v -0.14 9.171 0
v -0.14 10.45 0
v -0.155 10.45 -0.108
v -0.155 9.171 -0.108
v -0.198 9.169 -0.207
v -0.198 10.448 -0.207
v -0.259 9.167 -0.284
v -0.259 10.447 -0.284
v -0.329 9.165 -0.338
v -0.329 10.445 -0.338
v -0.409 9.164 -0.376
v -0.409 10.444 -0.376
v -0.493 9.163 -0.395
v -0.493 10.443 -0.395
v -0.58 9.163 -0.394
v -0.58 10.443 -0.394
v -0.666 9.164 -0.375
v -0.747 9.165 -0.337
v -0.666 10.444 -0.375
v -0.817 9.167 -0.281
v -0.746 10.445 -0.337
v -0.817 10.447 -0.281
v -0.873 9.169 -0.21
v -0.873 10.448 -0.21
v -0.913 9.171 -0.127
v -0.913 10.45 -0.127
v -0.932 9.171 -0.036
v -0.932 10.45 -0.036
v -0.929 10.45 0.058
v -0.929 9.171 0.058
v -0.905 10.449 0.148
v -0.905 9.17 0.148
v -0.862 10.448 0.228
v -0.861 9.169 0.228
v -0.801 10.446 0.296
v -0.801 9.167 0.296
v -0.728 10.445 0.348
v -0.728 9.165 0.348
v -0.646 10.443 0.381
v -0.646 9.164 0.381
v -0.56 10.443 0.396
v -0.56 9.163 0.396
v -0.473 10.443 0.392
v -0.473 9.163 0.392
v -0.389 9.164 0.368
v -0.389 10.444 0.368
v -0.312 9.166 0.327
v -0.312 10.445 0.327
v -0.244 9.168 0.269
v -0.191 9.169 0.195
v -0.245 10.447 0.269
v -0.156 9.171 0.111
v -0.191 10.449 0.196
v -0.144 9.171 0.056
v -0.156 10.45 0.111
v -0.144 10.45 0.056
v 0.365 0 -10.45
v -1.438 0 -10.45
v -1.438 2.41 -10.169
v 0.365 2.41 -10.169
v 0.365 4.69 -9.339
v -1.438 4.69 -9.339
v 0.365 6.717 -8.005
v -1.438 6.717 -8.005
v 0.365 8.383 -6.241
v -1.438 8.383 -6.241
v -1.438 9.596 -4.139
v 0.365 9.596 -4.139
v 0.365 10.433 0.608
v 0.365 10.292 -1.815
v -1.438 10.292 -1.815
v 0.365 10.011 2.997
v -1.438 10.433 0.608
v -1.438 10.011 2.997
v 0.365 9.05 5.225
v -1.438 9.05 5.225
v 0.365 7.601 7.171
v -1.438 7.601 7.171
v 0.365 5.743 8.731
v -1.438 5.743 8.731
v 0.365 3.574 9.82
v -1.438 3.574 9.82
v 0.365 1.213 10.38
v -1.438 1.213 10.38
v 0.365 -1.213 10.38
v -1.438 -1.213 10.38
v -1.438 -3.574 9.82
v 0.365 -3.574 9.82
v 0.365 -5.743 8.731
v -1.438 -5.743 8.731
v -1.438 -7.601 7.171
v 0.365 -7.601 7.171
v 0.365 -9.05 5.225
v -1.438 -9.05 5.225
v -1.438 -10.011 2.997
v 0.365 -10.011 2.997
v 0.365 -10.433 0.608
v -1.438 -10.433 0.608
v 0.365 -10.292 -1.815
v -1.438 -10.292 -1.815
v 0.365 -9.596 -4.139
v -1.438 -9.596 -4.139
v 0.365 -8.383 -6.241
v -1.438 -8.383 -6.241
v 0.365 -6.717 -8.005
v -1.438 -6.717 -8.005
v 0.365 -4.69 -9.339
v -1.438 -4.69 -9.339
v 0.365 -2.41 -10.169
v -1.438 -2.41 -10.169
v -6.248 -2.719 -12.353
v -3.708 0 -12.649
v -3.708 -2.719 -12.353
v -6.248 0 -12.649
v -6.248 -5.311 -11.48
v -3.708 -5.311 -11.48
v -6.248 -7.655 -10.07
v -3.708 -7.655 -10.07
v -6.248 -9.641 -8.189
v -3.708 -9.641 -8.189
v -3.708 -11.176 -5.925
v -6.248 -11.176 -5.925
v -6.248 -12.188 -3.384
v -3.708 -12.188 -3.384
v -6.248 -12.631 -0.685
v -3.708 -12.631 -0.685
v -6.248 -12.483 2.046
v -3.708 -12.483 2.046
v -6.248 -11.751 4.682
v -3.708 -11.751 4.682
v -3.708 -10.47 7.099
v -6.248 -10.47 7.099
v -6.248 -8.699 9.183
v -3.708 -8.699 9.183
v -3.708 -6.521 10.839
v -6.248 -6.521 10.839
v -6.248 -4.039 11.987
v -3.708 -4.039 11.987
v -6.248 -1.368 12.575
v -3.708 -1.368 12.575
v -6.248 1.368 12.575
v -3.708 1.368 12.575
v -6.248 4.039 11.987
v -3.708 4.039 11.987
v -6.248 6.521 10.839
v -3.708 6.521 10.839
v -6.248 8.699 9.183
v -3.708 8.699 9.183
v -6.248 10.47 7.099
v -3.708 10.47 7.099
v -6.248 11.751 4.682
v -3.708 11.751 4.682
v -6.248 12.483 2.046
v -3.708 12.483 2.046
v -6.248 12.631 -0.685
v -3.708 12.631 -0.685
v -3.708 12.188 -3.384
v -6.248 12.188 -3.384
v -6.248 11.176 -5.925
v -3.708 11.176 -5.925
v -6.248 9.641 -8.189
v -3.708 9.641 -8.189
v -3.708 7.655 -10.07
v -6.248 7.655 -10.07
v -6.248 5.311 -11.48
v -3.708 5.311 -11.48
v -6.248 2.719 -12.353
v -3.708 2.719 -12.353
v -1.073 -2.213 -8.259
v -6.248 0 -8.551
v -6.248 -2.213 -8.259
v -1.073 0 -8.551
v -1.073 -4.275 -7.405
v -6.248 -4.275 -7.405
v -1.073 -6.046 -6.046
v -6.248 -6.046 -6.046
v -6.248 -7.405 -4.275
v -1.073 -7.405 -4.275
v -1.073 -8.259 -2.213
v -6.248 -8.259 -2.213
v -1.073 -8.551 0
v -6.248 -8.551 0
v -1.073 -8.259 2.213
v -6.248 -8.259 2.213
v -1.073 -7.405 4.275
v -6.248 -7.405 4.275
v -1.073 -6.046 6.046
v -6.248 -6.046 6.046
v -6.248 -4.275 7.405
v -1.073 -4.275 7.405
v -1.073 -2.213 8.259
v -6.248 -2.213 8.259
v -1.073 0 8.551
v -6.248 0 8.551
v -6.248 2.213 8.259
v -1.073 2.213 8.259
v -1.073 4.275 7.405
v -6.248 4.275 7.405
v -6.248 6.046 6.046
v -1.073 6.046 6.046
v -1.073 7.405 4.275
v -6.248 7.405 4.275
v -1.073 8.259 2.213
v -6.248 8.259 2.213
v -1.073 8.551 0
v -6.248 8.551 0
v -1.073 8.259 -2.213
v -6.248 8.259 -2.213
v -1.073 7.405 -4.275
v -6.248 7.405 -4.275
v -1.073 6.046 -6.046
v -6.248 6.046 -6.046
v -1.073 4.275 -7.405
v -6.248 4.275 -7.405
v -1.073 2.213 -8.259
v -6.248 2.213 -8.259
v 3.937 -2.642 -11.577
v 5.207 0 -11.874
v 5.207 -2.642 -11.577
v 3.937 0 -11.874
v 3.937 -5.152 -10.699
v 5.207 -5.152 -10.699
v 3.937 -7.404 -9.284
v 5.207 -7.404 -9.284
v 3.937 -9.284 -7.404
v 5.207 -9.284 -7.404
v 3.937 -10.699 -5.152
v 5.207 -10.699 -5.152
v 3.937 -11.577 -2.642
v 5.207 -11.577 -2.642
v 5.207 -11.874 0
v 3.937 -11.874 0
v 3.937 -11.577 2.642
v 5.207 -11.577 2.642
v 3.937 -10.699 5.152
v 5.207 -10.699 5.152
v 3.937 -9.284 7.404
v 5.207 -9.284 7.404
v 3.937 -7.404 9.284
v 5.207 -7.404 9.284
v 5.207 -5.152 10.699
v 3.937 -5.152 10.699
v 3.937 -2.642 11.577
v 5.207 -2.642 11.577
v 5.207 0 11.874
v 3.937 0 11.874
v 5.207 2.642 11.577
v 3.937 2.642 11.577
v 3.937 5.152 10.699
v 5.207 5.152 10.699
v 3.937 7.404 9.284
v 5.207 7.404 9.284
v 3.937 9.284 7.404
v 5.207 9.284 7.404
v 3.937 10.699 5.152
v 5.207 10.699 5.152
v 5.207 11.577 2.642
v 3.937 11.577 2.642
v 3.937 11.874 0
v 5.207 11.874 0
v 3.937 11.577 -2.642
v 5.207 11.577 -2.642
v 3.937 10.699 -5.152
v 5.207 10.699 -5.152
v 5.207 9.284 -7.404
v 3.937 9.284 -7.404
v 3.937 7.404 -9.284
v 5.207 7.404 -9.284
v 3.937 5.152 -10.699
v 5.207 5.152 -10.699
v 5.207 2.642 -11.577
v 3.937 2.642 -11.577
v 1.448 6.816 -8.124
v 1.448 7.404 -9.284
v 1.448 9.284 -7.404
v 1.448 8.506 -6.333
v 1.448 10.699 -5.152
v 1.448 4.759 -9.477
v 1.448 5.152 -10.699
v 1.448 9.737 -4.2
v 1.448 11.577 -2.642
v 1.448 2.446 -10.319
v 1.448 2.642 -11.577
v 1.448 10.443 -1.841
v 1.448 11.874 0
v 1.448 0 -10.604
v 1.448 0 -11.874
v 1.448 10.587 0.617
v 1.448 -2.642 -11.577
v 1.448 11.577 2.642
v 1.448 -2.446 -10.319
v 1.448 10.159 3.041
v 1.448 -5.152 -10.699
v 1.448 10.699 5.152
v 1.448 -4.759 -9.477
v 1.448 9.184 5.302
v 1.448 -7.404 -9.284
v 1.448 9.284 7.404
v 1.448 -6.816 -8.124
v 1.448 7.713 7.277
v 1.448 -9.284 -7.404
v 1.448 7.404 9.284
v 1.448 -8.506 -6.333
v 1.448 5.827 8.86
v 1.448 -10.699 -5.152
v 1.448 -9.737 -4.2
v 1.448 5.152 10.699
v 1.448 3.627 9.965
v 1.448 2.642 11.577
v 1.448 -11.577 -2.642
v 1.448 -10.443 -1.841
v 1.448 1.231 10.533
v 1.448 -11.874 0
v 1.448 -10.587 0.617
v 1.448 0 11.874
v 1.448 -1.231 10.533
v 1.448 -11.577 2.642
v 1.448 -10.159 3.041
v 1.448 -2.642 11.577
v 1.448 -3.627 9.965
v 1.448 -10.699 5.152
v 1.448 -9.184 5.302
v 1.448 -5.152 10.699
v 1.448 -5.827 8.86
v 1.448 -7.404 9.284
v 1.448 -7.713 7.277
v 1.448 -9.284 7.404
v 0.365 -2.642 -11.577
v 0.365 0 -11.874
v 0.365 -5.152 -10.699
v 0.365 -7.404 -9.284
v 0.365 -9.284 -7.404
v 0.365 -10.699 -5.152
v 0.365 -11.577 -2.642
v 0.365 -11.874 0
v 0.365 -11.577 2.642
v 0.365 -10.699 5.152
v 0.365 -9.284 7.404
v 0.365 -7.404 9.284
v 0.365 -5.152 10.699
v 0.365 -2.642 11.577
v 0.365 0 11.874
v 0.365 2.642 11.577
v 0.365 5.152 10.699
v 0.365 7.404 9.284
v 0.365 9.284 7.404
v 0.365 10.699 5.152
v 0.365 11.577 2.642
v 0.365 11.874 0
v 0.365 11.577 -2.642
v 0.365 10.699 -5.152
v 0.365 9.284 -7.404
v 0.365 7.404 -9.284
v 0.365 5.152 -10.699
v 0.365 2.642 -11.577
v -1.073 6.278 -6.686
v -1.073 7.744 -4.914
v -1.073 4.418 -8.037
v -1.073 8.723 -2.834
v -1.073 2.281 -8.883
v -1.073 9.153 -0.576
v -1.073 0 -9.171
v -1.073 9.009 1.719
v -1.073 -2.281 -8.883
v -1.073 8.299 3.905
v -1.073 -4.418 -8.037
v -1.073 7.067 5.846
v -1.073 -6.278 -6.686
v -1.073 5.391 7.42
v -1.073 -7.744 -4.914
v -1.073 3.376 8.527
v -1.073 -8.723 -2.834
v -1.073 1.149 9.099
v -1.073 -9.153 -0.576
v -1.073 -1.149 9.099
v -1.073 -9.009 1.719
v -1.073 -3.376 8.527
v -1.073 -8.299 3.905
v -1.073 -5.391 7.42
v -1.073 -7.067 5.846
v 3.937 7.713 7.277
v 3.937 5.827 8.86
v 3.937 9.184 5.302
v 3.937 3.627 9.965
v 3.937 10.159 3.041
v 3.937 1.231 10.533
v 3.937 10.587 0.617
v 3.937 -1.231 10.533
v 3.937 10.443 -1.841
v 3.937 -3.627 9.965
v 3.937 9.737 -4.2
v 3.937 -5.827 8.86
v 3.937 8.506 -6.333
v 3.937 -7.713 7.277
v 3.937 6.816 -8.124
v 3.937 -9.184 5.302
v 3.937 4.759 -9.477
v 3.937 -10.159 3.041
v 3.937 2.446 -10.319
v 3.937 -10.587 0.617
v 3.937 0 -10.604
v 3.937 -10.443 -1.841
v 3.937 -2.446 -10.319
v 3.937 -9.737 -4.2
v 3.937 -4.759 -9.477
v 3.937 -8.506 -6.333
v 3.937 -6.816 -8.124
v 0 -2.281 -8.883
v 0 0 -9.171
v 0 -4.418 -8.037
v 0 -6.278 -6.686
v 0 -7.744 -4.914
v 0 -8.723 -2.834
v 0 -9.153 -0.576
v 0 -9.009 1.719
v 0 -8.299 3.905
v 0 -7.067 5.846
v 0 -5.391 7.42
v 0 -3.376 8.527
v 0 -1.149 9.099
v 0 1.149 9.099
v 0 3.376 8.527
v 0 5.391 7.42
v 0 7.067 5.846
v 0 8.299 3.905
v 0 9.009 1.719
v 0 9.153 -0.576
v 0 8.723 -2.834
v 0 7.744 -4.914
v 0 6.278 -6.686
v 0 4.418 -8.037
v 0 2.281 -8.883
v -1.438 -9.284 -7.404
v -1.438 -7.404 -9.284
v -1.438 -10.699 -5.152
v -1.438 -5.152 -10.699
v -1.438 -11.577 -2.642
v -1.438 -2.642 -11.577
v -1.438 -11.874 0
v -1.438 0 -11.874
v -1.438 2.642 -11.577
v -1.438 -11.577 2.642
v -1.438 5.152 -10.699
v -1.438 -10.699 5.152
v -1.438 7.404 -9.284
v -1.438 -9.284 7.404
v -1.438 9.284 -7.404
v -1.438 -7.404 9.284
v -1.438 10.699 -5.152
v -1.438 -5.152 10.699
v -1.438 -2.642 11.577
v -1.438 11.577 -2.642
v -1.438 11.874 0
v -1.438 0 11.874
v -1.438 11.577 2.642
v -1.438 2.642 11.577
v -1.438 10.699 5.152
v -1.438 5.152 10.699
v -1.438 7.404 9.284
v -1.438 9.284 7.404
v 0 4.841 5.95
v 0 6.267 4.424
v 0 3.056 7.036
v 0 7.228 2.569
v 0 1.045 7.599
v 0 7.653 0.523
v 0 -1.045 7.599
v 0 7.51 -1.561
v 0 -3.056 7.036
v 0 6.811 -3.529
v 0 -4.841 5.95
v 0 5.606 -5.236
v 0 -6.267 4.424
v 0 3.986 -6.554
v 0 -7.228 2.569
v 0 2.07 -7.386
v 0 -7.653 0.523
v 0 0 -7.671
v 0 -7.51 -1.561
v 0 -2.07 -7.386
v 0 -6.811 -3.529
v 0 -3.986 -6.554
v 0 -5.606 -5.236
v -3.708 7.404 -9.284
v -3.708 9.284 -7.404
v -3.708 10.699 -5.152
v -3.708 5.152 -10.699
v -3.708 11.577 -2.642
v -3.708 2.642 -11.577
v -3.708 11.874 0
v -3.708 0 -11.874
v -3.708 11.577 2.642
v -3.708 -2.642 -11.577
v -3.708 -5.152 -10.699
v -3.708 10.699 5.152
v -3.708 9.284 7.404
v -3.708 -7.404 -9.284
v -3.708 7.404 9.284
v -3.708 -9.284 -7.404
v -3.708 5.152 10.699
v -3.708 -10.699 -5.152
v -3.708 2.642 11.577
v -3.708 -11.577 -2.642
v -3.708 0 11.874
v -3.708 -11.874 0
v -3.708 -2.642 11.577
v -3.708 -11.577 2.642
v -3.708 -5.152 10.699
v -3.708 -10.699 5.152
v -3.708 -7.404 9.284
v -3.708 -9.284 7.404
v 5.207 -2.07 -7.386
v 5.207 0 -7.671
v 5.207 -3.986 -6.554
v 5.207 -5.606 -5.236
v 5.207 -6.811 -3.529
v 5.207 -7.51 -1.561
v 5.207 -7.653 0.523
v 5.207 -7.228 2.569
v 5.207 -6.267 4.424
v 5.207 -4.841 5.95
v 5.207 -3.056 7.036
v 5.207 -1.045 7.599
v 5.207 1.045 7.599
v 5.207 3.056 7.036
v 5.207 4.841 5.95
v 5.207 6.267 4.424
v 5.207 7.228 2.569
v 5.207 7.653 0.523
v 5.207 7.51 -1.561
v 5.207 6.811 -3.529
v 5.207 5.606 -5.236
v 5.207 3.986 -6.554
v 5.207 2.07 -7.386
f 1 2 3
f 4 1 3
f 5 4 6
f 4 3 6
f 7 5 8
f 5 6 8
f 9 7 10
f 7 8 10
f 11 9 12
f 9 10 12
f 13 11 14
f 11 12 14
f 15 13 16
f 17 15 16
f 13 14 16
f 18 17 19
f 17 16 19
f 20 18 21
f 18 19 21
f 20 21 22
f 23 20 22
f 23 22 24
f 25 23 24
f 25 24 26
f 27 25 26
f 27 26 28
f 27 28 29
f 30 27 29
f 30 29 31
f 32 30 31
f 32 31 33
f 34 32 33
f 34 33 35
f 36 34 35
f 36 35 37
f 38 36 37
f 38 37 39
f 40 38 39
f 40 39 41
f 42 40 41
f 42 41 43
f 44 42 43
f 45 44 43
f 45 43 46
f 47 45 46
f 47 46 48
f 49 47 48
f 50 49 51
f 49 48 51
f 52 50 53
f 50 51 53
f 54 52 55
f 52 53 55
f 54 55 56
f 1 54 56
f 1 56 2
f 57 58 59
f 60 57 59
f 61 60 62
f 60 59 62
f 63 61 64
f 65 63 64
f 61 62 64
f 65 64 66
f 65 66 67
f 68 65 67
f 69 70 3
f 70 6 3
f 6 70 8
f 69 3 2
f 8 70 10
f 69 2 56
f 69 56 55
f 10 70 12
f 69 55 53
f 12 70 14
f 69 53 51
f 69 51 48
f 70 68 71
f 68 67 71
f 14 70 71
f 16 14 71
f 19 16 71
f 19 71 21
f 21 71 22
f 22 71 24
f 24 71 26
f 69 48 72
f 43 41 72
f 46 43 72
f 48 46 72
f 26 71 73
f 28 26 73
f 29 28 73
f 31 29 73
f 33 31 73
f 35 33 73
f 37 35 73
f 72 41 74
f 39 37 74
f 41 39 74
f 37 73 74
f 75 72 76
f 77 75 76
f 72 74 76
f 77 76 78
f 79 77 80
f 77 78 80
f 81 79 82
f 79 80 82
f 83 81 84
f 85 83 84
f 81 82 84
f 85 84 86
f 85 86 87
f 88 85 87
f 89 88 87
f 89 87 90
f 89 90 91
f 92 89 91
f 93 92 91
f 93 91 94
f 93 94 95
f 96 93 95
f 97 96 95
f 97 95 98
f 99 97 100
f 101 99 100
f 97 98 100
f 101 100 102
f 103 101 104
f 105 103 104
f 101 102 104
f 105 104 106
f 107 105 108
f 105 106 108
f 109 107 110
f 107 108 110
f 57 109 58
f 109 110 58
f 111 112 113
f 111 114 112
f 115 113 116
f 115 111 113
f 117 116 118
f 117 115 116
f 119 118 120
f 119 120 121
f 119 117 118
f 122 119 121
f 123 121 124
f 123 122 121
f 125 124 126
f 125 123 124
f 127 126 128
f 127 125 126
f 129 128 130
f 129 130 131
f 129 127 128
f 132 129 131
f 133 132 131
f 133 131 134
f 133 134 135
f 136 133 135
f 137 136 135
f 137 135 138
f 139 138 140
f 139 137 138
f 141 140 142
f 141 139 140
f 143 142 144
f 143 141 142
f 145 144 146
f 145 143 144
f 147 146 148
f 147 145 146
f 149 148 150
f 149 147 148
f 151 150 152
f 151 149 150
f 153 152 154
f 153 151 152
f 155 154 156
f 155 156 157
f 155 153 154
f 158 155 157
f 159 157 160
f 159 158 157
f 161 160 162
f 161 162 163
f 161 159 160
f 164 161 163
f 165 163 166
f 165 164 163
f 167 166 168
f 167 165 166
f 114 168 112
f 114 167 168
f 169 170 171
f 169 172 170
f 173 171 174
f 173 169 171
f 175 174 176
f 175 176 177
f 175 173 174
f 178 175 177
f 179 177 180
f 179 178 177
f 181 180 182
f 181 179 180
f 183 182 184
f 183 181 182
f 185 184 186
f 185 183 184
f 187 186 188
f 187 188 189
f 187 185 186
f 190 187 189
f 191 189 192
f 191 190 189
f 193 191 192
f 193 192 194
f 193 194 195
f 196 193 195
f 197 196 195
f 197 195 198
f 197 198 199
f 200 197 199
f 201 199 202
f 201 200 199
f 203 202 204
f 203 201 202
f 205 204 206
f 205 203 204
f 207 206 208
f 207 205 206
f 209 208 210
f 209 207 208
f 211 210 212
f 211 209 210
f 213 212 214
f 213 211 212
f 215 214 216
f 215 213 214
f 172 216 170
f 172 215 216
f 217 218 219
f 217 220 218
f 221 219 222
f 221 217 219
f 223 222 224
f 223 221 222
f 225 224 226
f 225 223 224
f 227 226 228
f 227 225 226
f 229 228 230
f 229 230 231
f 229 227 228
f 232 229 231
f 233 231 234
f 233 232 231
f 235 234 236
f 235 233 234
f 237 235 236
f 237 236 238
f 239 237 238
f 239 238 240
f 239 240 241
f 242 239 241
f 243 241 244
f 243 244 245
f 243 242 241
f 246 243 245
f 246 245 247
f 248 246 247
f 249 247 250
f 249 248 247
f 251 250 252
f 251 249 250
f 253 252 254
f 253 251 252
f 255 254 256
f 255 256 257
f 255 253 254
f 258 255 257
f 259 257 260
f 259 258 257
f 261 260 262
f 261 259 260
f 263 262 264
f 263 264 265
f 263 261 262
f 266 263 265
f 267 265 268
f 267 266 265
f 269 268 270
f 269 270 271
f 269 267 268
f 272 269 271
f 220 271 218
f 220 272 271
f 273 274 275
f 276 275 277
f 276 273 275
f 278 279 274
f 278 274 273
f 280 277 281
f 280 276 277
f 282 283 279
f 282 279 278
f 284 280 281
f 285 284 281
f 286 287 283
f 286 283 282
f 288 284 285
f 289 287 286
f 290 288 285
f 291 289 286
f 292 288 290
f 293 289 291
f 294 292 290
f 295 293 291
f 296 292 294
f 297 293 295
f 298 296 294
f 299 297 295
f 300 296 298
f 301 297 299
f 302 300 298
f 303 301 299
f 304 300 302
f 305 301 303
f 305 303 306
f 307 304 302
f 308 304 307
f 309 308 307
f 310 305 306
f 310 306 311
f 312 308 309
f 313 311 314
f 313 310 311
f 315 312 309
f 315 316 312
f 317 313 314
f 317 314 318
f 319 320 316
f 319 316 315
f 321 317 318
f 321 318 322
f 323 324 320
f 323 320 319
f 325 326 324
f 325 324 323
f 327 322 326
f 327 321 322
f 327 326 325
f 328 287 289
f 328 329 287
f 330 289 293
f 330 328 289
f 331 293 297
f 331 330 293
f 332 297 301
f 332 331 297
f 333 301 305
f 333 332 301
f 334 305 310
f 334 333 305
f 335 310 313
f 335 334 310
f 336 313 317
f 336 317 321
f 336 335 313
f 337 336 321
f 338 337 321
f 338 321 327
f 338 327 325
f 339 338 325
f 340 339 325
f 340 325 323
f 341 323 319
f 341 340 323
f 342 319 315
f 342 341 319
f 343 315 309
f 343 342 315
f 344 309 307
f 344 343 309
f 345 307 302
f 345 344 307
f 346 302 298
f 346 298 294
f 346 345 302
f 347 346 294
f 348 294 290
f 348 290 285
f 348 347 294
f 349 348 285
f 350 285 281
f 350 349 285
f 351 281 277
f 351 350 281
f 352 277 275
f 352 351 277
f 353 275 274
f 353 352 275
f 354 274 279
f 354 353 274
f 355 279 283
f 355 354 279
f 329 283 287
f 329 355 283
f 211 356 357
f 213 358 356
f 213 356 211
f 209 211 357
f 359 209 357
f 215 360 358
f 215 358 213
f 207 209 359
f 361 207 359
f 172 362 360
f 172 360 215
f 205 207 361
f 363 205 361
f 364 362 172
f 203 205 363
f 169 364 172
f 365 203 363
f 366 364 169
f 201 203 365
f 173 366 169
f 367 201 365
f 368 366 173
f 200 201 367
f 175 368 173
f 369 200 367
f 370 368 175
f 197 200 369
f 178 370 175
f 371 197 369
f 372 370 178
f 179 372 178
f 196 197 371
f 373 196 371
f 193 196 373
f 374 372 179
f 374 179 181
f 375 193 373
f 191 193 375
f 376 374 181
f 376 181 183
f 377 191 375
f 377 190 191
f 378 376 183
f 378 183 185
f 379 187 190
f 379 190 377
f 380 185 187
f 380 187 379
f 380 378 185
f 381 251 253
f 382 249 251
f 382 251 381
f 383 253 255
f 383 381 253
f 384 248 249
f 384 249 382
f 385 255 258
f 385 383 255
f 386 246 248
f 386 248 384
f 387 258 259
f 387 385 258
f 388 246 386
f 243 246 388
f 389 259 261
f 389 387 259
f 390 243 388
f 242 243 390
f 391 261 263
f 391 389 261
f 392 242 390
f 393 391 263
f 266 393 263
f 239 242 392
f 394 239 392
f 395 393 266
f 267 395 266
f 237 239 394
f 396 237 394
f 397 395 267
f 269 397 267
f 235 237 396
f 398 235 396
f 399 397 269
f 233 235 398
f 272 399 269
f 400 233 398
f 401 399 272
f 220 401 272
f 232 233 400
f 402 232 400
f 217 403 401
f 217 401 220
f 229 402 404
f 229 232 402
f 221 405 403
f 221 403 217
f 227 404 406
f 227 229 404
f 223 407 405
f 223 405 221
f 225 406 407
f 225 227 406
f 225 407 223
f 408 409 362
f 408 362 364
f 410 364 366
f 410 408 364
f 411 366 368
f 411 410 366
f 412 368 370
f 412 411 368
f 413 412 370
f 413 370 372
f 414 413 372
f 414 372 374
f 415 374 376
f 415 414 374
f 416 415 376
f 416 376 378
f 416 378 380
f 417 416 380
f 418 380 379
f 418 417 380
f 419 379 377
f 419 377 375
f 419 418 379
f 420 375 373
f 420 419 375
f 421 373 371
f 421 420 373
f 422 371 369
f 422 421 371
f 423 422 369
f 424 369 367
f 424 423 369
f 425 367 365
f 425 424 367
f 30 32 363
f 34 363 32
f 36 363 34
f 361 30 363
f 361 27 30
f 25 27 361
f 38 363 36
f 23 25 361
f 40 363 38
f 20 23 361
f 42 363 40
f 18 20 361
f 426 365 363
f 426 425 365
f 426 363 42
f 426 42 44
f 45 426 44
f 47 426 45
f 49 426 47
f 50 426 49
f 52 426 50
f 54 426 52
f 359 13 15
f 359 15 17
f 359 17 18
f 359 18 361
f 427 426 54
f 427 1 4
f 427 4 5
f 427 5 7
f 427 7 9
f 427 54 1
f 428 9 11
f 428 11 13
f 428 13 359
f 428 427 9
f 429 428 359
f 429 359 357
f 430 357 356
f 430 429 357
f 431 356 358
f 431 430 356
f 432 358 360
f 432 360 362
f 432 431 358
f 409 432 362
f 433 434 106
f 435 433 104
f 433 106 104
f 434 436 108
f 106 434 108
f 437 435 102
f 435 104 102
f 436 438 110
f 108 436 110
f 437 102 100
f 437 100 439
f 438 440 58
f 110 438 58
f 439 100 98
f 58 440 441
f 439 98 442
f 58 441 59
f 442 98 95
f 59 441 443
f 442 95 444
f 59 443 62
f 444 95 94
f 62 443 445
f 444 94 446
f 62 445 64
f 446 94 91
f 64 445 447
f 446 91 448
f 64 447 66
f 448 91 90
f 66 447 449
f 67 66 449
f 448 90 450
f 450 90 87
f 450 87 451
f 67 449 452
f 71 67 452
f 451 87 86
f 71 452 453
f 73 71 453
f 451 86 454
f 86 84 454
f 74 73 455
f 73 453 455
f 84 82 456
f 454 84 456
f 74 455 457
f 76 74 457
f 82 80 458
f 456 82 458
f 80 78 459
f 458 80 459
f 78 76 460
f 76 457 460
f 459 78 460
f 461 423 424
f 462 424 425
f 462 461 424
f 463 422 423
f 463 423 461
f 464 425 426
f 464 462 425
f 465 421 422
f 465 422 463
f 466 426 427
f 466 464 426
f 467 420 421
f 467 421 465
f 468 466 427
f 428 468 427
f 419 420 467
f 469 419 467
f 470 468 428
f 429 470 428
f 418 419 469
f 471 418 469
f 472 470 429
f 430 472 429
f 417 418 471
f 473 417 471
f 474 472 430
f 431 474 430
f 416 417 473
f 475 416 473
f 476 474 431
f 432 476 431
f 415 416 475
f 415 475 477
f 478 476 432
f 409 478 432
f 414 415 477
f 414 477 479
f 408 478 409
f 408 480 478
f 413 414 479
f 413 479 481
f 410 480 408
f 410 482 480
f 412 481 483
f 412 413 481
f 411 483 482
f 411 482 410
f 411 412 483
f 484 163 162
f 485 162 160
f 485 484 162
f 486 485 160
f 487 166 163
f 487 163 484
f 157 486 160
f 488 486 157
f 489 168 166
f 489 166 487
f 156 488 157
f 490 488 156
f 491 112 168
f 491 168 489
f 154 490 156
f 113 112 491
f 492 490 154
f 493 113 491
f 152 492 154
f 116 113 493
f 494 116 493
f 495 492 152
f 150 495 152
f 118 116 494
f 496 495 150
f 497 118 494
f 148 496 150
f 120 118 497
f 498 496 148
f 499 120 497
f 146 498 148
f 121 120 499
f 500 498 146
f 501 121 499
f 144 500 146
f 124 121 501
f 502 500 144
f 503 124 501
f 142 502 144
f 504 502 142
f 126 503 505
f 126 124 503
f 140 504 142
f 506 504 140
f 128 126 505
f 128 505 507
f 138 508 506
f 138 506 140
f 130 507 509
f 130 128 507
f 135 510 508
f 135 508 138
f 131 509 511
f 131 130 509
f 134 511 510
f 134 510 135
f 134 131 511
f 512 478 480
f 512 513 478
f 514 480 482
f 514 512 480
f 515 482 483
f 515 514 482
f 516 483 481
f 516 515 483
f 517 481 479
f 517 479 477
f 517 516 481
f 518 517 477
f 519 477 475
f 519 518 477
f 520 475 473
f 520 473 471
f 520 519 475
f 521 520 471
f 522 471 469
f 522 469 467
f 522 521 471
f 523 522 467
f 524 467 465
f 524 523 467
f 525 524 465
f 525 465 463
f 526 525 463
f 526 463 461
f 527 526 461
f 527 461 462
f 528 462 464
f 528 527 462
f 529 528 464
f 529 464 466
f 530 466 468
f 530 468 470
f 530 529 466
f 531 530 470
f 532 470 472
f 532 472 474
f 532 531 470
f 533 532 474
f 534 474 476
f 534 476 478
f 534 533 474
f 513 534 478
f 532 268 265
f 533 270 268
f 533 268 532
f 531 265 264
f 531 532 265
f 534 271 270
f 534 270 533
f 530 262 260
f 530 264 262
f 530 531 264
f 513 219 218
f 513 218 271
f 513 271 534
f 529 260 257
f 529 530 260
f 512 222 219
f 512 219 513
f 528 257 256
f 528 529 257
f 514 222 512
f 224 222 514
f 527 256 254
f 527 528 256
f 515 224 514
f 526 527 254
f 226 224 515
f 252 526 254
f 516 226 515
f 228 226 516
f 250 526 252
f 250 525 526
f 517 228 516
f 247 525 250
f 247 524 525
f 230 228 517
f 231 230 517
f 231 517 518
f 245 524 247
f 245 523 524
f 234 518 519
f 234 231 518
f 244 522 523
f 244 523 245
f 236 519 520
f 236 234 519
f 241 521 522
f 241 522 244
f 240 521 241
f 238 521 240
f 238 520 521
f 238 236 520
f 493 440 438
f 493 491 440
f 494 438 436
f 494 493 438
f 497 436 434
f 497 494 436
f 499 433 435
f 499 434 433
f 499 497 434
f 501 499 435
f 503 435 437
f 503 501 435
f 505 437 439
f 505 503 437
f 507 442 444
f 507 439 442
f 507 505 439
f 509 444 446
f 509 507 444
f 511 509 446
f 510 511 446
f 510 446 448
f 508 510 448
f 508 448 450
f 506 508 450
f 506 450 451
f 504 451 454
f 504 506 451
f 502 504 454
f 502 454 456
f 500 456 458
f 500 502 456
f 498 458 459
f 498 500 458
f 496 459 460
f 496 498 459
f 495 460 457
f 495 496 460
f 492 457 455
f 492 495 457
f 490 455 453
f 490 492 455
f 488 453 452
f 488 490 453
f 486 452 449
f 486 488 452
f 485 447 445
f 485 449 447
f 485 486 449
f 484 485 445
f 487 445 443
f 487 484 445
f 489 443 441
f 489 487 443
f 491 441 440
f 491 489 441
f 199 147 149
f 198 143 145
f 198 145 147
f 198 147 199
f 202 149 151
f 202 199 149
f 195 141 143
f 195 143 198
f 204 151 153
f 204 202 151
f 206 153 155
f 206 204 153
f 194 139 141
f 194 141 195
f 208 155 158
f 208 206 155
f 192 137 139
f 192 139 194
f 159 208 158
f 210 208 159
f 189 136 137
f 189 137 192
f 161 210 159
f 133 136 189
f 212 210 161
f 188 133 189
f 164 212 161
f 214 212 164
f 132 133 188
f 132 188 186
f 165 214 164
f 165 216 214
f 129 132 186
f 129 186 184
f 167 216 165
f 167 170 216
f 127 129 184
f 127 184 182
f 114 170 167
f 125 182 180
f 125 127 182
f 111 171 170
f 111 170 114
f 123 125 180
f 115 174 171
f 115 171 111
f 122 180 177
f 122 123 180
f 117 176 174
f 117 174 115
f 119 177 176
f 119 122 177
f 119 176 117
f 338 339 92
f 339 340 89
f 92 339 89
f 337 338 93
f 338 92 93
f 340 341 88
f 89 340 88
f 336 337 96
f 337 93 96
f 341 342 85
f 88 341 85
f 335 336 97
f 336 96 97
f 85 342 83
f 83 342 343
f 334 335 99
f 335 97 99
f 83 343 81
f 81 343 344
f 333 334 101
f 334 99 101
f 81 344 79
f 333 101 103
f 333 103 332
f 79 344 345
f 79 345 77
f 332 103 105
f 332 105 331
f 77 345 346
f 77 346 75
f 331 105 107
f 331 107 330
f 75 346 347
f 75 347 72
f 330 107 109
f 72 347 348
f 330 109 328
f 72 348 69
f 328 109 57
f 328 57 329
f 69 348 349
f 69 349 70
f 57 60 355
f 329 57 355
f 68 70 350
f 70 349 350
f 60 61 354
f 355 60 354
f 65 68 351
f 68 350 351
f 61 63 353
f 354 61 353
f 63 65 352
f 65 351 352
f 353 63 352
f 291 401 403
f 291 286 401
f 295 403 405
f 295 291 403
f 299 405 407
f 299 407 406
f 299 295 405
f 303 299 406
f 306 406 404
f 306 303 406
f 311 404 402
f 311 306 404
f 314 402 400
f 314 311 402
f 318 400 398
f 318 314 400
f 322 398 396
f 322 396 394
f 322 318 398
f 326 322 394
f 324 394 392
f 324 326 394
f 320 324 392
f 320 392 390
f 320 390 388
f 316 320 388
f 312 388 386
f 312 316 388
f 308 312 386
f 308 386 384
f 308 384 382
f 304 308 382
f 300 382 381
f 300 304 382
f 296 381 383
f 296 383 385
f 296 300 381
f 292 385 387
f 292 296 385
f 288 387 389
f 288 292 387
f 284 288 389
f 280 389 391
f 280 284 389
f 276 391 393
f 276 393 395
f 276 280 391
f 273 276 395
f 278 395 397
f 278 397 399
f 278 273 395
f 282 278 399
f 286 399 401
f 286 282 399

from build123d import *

# Parameters (mm, degrees)
F_1_32_0_03125_DIAMETER_HOLE1_REACH  = 30.292
F_1_32_0_03125_DIAMETER_HOLE1_BORE_R = 0.396875


with BuildPart() as part:
    # Sketch1 → Revolve1 (revolve)
    with BuildSketch(Plane.XY, mode=Mode.PRIVATE) as revolve1_sk:
        Polygon((-6.2484, 12.6492), (-6.2484, 8.550800018), (-1.073308102, 8.550800018), (-1.073308102, 9.17149847), (0, 9.17149847), (0, 8.550800018), (0, 7.6708), (5.207, 7.6708), (5.207, 11.8745), (3.937, 11.8745), (3.937, 10.6045), (1.4478, 10.6045), (1.4478, 11.8745), (-3.7084, 11.8745), (-3.7084, 12.6492), align=None)
    revolve(revolve1_sk.sketch.rotate(Axis((0, 0, 0), (-1, 0, 0)), 90), axis=Axis((0, 0, 0), (-1, 0, 0)))

    # 1/32 (0.03125) Diameter Hole1 bore → 1/32 (0.03125) Diameter Hole1 (cut, up to next)
    with BuildSketch(Plane(origin=(0, 11.8745, 0), x_dir=(1, 0, 0), z_dir=(0, 1, 0)), mode=Mode.PRIVATE) as f_1_32_0_03125_diameter_hole1_sk1:
        with Locations((-0.536654051, 0)):
            Circle(F_1_32_0_03125_DIAMETER_HOLE1_BORE_R)
    f_1_32_0_03125_diameter_hole1_tool1 = extrude(f_1_32_0_03125_diameter_hole1_sk1.sketch, amount=-F_1_32_0_03125_DIAMETER_HOLE1_REACH, mode=Mode.PRIVATE) & part.part
    add(f_1_32_0_03125_diameter_hole1_tool1.solids().sort_by_distance((-0.536654, 11.8745, 0))[0], mode=Mode.SUBTRACT)

    # Sketch4 → Cut-Revolve3 (revolve, cut)
    with BuildSketch(Plane.XY, mode=Mode.PRIVATE) as cut_revolve3_sk:
        with BuildLine():
            Line((-0.139779051, 11.8745), (0.364997855, 11.8745))
            Line((0.364997855, 11.8745), (0.364997855, 10.450394686))
            Line((0.364997855, 10.450394686), (-1.438305958, 10.450394686))
            Line((-1.438305958, 10.450394686), (-1.438305958, 11.8745))
            Line((-1.438305958, 11.8745), (-0.933529051, 11.8745))
            add(Edge.make_bspline(
                [(-0.139779051, 11.8745), (-0.536654051, 11.861235461), (-0.933529051, 11.8745)],
                knots=[0, 0, 0, 1, 1, 1], degree=2, weights=[0.011477625, 0.0118745, 0.012271375]))
        make_face()
    revolve(cut_revolve3_sk.sketch.rotate(Axis((-6.82117, 0, 0), (1, 0, 0)), 270), axis=Axis((-6.82117, 0, 0), (1, 0, 0)), mode=Mode.SUBTRACT)


with BuildPart() as cut_revolve3_kept_piece:
    # of the separate pieces the step leaves, the one the design keeps (cut_revolve3_pieces_kept)
    add(part.part.solids().sort_by_distance((-6.2484, 0, -12.6492))[0])


solid = cut_revolve3_kept_piece.part
